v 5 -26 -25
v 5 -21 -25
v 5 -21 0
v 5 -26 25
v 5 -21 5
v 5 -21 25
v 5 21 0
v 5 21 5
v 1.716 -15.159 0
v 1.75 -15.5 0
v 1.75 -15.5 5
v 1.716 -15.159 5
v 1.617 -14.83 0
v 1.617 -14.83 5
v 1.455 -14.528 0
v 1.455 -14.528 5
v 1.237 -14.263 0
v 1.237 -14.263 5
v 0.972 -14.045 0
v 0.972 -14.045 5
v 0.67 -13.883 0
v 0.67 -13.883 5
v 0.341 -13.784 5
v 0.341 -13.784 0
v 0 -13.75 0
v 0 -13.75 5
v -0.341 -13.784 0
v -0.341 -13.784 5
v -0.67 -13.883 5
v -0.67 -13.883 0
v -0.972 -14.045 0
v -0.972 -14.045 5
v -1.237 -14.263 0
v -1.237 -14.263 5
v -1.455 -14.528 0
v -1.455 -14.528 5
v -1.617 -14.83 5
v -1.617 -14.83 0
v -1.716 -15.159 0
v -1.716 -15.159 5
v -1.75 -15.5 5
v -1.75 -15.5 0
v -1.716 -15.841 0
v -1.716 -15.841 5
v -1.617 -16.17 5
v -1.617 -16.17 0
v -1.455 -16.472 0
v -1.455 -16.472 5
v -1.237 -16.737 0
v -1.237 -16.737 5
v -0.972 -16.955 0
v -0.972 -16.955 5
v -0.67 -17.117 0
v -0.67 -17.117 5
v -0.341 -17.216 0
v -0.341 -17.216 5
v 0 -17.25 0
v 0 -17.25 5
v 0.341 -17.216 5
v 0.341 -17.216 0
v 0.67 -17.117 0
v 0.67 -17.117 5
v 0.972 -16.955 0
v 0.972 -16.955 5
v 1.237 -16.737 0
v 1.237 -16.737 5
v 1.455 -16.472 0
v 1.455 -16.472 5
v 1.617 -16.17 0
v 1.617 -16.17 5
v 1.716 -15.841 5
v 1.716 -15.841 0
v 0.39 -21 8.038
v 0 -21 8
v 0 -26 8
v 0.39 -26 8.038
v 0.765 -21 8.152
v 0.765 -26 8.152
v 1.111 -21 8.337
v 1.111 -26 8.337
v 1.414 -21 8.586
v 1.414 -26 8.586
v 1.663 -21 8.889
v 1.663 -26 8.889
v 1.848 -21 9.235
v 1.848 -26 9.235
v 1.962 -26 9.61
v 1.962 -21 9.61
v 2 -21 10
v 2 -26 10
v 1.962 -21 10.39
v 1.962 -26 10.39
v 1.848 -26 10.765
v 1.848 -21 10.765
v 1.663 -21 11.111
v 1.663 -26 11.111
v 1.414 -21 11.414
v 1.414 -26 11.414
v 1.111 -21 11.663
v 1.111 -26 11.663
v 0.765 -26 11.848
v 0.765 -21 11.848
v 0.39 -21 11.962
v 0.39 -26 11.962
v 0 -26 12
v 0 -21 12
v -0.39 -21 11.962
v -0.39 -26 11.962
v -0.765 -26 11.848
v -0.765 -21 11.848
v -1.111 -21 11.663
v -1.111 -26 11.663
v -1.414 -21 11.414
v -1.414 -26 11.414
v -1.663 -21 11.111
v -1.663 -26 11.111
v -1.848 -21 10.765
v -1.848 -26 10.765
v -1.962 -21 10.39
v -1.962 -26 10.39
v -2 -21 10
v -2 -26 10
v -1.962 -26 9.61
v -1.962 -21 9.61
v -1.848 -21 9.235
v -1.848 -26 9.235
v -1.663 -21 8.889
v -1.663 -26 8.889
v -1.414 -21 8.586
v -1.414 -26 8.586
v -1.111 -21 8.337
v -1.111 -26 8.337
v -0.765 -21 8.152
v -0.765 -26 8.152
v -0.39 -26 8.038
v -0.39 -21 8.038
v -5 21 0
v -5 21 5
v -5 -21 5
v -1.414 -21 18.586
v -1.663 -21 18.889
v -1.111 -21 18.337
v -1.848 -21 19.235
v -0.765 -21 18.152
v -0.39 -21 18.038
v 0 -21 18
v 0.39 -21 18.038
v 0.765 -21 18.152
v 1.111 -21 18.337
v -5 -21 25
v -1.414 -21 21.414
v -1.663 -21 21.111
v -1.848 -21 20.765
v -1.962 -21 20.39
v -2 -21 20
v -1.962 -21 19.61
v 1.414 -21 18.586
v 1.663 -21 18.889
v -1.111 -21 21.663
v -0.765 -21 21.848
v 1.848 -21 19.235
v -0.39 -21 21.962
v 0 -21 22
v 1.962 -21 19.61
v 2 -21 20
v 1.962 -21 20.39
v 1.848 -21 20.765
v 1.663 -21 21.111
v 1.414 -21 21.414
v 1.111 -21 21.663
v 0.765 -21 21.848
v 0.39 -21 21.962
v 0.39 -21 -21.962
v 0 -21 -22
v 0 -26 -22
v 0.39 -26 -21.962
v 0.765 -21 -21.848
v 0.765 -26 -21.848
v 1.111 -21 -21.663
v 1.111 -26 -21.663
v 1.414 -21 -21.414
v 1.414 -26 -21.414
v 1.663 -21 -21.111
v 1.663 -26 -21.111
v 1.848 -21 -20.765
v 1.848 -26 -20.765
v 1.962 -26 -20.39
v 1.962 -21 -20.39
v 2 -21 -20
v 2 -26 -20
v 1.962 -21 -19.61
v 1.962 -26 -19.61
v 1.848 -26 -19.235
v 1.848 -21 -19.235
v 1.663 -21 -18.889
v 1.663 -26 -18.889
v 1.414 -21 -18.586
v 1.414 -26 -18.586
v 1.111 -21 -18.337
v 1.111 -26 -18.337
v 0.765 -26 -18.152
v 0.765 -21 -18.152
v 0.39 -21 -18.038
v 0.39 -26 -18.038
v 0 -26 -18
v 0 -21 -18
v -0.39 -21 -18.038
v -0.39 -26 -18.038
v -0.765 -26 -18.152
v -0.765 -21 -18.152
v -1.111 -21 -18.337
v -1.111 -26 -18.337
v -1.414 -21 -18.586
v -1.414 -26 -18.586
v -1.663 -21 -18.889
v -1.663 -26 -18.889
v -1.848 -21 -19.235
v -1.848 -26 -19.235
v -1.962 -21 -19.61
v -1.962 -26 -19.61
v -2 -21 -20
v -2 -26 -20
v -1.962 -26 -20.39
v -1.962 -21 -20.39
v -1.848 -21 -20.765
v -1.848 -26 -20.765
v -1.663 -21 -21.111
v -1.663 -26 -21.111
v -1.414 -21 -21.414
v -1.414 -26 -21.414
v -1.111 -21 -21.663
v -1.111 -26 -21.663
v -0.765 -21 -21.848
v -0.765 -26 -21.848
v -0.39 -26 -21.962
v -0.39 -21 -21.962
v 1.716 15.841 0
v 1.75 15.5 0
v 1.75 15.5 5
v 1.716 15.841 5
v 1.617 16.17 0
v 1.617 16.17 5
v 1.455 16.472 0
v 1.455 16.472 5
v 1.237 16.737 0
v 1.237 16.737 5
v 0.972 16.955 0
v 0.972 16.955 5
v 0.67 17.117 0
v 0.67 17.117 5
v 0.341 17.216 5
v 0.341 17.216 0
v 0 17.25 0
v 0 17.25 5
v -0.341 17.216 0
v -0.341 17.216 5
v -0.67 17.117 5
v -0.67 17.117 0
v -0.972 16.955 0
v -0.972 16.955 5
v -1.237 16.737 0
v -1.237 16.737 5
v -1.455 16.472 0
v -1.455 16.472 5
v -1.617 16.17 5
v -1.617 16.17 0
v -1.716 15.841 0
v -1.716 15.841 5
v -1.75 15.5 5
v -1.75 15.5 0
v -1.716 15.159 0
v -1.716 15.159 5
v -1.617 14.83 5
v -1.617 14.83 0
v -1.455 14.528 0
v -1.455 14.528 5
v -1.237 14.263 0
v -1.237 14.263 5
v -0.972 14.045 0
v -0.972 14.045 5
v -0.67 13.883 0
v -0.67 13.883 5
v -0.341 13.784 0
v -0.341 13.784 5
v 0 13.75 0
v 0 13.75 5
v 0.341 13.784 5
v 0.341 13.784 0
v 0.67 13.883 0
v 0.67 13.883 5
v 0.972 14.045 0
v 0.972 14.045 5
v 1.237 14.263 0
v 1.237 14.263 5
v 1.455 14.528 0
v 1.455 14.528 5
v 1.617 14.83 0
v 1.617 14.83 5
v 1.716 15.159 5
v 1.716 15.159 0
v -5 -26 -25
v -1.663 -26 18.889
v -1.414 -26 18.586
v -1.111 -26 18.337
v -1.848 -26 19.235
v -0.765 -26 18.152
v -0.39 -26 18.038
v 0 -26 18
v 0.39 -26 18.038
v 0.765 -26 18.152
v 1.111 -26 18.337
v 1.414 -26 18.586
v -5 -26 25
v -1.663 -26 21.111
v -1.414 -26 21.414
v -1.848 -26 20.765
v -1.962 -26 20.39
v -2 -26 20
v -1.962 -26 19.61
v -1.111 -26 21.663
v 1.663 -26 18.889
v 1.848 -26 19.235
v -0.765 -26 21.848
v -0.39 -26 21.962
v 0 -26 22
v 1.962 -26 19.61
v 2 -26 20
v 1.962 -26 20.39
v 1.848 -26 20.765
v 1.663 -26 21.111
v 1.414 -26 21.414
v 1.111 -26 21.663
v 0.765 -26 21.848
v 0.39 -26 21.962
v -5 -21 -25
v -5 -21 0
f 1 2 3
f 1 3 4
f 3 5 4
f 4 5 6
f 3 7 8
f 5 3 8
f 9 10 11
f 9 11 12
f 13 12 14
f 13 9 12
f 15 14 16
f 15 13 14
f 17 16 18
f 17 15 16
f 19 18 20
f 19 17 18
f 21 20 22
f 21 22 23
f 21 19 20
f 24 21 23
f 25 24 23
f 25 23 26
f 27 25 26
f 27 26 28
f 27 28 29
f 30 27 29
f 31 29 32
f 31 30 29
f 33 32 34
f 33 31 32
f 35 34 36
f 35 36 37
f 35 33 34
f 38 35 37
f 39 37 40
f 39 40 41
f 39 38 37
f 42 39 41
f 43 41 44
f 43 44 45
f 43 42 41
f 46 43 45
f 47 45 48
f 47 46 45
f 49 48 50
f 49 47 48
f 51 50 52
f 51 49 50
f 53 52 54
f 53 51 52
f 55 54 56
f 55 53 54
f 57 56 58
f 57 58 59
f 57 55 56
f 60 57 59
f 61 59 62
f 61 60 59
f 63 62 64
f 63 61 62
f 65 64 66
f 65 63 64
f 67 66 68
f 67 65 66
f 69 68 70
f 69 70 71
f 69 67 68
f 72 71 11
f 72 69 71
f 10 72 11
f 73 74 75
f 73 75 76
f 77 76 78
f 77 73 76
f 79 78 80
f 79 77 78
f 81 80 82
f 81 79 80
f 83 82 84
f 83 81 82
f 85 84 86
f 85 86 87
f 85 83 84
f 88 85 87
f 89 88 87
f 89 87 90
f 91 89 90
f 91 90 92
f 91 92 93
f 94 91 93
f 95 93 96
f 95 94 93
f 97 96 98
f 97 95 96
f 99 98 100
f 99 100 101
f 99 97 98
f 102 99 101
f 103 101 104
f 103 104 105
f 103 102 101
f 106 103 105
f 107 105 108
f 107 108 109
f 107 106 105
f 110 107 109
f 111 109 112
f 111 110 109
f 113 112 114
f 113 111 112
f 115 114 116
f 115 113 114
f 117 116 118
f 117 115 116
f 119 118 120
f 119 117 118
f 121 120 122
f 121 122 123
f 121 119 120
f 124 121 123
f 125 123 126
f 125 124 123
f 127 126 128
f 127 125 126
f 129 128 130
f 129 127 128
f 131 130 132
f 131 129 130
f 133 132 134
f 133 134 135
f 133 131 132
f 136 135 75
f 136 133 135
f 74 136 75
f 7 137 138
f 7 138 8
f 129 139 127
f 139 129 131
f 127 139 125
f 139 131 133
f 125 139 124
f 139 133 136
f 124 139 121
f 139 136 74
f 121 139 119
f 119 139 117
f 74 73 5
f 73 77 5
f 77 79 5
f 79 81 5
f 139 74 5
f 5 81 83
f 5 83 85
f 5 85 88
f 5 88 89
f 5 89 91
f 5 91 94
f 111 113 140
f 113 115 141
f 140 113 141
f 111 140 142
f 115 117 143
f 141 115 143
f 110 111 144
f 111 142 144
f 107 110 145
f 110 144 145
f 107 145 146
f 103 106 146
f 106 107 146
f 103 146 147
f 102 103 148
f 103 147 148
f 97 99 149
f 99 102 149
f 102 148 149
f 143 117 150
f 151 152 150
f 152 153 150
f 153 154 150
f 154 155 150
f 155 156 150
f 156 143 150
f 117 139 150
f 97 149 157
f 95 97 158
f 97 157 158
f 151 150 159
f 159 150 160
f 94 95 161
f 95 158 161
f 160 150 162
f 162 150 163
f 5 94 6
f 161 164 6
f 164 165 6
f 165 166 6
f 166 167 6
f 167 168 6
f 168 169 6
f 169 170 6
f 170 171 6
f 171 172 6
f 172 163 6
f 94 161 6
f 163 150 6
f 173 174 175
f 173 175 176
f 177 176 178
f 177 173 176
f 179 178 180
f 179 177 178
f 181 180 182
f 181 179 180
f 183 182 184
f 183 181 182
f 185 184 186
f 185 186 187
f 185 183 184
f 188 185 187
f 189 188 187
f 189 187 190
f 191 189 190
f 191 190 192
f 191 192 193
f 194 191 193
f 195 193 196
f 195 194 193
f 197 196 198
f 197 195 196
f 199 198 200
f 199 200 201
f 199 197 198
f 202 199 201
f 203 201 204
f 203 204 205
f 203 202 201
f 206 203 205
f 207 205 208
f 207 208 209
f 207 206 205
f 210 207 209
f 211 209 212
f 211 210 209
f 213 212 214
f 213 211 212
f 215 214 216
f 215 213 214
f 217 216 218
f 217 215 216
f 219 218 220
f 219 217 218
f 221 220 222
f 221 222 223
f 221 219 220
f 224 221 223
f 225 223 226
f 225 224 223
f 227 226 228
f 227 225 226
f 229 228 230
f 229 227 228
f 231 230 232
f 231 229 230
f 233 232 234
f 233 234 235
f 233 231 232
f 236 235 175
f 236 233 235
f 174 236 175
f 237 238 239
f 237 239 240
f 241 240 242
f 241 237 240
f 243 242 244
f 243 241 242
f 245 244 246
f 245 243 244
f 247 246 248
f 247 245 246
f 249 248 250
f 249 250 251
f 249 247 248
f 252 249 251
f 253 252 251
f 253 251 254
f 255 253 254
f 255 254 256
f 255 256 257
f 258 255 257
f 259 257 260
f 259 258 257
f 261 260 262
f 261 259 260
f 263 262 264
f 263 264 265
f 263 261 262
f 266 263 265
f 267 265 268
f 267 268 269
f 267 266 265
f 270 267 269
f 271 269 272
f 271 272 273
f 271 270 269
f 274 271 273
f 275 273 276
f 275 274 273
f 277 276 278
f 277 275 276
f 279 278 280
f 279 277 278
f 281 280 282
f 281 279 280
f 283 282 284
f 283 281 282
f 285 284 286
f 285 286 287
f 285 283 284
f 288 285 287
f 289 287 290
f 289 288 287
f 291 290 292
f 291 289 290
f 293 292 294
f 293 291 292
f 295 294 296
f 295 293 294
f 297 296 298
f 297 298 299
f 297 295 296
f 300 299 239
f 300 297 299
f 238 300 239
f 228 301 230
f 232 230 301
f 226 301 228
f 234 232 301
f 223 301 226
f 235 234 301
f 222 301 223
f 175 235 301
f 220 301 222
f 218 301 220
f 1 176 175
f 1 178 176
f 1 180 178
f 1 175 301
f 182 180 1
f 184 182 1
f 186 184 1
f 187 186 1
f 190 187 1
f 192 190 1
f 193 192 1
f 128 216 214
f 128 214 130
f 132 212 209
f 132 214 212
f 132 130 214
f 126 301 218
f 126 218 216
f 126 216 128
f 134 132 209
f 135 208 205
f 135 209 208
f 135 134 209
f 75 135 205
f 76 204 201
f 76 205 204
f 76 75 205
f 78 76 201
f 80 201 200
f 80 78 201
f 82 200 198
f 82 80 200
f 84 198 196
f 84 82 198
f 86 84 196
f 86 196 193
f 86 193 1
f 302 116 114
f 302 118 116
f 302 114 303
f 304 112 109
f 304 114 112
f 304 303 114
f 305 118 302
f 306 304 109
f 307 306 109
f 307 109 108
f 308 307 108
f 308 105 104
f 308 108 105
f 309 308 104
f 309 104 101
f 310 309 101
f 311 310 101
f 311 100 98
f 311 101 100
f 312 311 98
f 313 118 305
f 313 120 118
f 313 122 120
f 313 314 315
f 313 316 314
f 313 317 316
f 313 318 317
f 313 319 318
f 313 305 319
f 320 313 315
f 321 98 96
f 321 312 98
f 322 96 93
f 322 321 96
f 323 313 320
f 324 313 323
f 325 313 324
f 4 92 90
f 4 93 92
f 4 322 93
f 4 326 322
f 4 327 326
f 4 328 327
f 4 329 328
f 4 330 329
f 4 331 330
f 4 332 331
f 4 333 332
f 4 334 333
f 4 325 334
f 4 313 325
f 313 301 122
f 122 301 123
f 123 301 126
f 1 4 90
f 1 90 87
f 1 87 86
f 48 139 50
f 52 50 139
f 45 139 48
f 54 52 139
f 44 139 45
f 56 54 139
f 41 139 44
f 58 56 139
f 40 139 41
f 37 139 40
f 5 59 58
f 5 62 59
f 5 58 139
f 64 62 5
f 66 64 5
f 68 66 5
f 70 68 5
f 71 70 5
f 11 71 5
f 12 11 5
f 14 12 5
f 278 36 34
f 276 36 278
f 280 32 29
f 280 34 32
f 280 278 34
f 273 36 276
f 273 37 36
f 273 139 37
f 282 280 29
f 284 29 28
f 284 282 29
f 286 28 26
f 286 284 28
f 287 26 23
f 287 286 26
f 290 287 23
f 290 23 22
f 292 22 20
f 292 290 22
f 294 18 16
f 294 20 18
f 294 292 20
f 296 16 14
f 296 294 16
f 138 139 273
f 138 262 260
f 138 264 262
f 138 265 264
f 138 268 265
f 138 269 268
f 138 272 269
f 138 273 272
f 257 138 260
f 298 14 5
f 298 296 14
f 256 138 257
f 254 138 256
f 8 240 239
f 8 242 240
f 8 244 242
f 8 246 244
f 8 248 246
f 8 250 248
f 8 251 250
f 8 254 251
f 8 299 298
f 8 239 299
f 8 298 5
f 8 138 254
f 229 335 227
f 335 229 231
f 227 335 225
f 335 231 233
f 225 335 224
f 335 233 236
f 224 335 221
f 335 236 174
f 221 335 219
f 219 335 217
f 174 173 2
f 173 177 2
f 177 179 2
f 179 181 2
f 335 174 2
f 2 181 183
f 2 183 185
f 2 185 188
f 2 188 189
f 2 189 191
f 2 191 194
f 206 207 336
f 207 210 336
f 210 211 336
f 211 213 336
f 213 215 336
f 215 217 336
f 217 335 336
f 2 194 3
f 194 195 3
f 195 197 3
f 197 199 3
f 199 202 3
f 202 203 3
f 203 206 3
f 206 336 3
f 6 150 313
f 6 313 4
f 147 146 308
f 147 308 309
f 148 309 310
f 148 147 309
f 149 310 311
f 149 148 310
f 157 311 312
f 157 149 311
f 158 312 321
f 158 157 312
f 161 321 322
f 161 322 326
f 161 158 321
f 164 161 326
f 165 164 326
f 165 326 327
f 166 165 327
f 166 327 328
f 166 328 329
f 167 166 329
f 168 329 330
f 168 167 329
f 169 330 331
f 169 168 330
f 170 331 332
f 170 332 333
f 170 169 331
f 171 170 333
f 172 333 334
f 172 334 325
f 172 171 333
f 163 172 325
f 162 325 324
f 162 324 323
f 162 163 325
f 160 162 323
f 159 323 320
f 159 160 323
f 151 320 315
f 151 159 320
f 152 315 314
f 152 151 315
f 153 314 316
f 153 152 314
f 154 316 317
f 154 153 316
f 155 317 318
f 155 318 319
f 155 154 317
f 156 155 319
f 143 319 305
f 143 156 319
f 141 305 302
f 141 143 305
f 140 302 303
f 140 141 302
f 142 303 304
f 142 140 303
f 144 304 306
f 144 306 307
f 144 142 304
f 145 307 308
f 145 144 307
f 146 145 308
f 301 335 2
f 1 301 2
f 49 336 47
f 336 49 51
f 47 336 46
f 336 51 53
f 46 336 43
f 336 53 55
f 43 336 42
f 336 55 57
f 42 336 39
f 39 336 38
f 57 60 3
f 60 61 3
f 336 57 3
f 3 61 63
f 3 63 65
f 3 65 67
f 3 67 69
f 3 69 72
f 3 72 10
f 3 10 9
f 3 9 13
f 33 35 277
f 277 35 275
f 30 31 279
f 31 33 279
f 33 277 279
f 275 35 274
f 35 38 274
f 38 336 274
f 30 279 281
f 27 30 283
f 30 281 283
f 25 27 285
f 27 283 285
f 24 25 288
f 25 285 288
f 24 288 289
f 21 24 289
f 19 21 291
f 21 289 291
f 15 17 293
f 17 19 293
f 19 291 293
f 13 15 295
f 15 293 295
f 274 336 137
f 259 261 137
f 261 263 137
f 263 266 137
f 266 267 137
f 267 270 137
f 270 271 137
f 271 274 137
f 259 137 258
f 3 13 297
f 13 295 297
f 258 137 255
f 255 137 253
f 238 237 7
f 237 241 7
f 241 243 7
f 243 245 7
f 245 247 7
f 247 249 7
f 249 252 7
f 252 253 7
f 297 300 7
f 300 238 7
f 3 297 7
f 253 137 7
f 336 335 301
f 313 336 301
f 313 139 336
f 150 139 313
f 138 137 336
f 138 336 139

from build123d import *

# Parameters (mm, degrees)
ESBO_O1_W                = 10
ESBO_O1_H                = 42
ESBO_O1_R                = 1.75
RESSALTO_EXTRUS_O1_DEPTH = 5
ESBO_O2_W                = 10
ESBO_O2_H                = 50
ESBO_O2_R                = 2
RESSALTO_EXTRUS_O2_DEPTH = 5


with BuildPart() as part:
    # Esboço1 → Ressalto-extrusão1 (new body)
    with BuildSketch(Plane.XY):
        Rectangle(ESBO_O1_W, ESBO_O1_H)
        with Locations((0, 15.5)):
            Circle(ESBO_O1_R, mode=Mode.SUBTRACT)
        with Locations((0, -15.5)):
            Circle(ESBO_O1_R, mode=Mode.SUBTRACT)
    extrude(amount=RESSALTO_EXTRUS_O1_DEPTH)

    # Esboço2 → Ressalto-extrusão2 (add)
    with BuildSketch(Plane.XZ.offset(21)):
        Rectangle(ESBO_O2_W, ESBO_O2_H)
        with Locations(Location((0, 20, 0), (0, 0, 270))):
            Circle(ESBO_O2_R, mode=Mode.SUBTRACT)
        with Locations(Location((0, -20, 0), (0, 0, 270))):
            Circle(ESBO_O2_R, mode=Mode.SUBTRACT)
        with Locations(Location((0, 10, 0), (0, 0, 270))):
            Circle(ESBO_O2_R, mode=Mode.SUBTRACT)
    extrude(amount=RESSALTO_EXTRUS_O2_DEPTH)


solid = part.part
